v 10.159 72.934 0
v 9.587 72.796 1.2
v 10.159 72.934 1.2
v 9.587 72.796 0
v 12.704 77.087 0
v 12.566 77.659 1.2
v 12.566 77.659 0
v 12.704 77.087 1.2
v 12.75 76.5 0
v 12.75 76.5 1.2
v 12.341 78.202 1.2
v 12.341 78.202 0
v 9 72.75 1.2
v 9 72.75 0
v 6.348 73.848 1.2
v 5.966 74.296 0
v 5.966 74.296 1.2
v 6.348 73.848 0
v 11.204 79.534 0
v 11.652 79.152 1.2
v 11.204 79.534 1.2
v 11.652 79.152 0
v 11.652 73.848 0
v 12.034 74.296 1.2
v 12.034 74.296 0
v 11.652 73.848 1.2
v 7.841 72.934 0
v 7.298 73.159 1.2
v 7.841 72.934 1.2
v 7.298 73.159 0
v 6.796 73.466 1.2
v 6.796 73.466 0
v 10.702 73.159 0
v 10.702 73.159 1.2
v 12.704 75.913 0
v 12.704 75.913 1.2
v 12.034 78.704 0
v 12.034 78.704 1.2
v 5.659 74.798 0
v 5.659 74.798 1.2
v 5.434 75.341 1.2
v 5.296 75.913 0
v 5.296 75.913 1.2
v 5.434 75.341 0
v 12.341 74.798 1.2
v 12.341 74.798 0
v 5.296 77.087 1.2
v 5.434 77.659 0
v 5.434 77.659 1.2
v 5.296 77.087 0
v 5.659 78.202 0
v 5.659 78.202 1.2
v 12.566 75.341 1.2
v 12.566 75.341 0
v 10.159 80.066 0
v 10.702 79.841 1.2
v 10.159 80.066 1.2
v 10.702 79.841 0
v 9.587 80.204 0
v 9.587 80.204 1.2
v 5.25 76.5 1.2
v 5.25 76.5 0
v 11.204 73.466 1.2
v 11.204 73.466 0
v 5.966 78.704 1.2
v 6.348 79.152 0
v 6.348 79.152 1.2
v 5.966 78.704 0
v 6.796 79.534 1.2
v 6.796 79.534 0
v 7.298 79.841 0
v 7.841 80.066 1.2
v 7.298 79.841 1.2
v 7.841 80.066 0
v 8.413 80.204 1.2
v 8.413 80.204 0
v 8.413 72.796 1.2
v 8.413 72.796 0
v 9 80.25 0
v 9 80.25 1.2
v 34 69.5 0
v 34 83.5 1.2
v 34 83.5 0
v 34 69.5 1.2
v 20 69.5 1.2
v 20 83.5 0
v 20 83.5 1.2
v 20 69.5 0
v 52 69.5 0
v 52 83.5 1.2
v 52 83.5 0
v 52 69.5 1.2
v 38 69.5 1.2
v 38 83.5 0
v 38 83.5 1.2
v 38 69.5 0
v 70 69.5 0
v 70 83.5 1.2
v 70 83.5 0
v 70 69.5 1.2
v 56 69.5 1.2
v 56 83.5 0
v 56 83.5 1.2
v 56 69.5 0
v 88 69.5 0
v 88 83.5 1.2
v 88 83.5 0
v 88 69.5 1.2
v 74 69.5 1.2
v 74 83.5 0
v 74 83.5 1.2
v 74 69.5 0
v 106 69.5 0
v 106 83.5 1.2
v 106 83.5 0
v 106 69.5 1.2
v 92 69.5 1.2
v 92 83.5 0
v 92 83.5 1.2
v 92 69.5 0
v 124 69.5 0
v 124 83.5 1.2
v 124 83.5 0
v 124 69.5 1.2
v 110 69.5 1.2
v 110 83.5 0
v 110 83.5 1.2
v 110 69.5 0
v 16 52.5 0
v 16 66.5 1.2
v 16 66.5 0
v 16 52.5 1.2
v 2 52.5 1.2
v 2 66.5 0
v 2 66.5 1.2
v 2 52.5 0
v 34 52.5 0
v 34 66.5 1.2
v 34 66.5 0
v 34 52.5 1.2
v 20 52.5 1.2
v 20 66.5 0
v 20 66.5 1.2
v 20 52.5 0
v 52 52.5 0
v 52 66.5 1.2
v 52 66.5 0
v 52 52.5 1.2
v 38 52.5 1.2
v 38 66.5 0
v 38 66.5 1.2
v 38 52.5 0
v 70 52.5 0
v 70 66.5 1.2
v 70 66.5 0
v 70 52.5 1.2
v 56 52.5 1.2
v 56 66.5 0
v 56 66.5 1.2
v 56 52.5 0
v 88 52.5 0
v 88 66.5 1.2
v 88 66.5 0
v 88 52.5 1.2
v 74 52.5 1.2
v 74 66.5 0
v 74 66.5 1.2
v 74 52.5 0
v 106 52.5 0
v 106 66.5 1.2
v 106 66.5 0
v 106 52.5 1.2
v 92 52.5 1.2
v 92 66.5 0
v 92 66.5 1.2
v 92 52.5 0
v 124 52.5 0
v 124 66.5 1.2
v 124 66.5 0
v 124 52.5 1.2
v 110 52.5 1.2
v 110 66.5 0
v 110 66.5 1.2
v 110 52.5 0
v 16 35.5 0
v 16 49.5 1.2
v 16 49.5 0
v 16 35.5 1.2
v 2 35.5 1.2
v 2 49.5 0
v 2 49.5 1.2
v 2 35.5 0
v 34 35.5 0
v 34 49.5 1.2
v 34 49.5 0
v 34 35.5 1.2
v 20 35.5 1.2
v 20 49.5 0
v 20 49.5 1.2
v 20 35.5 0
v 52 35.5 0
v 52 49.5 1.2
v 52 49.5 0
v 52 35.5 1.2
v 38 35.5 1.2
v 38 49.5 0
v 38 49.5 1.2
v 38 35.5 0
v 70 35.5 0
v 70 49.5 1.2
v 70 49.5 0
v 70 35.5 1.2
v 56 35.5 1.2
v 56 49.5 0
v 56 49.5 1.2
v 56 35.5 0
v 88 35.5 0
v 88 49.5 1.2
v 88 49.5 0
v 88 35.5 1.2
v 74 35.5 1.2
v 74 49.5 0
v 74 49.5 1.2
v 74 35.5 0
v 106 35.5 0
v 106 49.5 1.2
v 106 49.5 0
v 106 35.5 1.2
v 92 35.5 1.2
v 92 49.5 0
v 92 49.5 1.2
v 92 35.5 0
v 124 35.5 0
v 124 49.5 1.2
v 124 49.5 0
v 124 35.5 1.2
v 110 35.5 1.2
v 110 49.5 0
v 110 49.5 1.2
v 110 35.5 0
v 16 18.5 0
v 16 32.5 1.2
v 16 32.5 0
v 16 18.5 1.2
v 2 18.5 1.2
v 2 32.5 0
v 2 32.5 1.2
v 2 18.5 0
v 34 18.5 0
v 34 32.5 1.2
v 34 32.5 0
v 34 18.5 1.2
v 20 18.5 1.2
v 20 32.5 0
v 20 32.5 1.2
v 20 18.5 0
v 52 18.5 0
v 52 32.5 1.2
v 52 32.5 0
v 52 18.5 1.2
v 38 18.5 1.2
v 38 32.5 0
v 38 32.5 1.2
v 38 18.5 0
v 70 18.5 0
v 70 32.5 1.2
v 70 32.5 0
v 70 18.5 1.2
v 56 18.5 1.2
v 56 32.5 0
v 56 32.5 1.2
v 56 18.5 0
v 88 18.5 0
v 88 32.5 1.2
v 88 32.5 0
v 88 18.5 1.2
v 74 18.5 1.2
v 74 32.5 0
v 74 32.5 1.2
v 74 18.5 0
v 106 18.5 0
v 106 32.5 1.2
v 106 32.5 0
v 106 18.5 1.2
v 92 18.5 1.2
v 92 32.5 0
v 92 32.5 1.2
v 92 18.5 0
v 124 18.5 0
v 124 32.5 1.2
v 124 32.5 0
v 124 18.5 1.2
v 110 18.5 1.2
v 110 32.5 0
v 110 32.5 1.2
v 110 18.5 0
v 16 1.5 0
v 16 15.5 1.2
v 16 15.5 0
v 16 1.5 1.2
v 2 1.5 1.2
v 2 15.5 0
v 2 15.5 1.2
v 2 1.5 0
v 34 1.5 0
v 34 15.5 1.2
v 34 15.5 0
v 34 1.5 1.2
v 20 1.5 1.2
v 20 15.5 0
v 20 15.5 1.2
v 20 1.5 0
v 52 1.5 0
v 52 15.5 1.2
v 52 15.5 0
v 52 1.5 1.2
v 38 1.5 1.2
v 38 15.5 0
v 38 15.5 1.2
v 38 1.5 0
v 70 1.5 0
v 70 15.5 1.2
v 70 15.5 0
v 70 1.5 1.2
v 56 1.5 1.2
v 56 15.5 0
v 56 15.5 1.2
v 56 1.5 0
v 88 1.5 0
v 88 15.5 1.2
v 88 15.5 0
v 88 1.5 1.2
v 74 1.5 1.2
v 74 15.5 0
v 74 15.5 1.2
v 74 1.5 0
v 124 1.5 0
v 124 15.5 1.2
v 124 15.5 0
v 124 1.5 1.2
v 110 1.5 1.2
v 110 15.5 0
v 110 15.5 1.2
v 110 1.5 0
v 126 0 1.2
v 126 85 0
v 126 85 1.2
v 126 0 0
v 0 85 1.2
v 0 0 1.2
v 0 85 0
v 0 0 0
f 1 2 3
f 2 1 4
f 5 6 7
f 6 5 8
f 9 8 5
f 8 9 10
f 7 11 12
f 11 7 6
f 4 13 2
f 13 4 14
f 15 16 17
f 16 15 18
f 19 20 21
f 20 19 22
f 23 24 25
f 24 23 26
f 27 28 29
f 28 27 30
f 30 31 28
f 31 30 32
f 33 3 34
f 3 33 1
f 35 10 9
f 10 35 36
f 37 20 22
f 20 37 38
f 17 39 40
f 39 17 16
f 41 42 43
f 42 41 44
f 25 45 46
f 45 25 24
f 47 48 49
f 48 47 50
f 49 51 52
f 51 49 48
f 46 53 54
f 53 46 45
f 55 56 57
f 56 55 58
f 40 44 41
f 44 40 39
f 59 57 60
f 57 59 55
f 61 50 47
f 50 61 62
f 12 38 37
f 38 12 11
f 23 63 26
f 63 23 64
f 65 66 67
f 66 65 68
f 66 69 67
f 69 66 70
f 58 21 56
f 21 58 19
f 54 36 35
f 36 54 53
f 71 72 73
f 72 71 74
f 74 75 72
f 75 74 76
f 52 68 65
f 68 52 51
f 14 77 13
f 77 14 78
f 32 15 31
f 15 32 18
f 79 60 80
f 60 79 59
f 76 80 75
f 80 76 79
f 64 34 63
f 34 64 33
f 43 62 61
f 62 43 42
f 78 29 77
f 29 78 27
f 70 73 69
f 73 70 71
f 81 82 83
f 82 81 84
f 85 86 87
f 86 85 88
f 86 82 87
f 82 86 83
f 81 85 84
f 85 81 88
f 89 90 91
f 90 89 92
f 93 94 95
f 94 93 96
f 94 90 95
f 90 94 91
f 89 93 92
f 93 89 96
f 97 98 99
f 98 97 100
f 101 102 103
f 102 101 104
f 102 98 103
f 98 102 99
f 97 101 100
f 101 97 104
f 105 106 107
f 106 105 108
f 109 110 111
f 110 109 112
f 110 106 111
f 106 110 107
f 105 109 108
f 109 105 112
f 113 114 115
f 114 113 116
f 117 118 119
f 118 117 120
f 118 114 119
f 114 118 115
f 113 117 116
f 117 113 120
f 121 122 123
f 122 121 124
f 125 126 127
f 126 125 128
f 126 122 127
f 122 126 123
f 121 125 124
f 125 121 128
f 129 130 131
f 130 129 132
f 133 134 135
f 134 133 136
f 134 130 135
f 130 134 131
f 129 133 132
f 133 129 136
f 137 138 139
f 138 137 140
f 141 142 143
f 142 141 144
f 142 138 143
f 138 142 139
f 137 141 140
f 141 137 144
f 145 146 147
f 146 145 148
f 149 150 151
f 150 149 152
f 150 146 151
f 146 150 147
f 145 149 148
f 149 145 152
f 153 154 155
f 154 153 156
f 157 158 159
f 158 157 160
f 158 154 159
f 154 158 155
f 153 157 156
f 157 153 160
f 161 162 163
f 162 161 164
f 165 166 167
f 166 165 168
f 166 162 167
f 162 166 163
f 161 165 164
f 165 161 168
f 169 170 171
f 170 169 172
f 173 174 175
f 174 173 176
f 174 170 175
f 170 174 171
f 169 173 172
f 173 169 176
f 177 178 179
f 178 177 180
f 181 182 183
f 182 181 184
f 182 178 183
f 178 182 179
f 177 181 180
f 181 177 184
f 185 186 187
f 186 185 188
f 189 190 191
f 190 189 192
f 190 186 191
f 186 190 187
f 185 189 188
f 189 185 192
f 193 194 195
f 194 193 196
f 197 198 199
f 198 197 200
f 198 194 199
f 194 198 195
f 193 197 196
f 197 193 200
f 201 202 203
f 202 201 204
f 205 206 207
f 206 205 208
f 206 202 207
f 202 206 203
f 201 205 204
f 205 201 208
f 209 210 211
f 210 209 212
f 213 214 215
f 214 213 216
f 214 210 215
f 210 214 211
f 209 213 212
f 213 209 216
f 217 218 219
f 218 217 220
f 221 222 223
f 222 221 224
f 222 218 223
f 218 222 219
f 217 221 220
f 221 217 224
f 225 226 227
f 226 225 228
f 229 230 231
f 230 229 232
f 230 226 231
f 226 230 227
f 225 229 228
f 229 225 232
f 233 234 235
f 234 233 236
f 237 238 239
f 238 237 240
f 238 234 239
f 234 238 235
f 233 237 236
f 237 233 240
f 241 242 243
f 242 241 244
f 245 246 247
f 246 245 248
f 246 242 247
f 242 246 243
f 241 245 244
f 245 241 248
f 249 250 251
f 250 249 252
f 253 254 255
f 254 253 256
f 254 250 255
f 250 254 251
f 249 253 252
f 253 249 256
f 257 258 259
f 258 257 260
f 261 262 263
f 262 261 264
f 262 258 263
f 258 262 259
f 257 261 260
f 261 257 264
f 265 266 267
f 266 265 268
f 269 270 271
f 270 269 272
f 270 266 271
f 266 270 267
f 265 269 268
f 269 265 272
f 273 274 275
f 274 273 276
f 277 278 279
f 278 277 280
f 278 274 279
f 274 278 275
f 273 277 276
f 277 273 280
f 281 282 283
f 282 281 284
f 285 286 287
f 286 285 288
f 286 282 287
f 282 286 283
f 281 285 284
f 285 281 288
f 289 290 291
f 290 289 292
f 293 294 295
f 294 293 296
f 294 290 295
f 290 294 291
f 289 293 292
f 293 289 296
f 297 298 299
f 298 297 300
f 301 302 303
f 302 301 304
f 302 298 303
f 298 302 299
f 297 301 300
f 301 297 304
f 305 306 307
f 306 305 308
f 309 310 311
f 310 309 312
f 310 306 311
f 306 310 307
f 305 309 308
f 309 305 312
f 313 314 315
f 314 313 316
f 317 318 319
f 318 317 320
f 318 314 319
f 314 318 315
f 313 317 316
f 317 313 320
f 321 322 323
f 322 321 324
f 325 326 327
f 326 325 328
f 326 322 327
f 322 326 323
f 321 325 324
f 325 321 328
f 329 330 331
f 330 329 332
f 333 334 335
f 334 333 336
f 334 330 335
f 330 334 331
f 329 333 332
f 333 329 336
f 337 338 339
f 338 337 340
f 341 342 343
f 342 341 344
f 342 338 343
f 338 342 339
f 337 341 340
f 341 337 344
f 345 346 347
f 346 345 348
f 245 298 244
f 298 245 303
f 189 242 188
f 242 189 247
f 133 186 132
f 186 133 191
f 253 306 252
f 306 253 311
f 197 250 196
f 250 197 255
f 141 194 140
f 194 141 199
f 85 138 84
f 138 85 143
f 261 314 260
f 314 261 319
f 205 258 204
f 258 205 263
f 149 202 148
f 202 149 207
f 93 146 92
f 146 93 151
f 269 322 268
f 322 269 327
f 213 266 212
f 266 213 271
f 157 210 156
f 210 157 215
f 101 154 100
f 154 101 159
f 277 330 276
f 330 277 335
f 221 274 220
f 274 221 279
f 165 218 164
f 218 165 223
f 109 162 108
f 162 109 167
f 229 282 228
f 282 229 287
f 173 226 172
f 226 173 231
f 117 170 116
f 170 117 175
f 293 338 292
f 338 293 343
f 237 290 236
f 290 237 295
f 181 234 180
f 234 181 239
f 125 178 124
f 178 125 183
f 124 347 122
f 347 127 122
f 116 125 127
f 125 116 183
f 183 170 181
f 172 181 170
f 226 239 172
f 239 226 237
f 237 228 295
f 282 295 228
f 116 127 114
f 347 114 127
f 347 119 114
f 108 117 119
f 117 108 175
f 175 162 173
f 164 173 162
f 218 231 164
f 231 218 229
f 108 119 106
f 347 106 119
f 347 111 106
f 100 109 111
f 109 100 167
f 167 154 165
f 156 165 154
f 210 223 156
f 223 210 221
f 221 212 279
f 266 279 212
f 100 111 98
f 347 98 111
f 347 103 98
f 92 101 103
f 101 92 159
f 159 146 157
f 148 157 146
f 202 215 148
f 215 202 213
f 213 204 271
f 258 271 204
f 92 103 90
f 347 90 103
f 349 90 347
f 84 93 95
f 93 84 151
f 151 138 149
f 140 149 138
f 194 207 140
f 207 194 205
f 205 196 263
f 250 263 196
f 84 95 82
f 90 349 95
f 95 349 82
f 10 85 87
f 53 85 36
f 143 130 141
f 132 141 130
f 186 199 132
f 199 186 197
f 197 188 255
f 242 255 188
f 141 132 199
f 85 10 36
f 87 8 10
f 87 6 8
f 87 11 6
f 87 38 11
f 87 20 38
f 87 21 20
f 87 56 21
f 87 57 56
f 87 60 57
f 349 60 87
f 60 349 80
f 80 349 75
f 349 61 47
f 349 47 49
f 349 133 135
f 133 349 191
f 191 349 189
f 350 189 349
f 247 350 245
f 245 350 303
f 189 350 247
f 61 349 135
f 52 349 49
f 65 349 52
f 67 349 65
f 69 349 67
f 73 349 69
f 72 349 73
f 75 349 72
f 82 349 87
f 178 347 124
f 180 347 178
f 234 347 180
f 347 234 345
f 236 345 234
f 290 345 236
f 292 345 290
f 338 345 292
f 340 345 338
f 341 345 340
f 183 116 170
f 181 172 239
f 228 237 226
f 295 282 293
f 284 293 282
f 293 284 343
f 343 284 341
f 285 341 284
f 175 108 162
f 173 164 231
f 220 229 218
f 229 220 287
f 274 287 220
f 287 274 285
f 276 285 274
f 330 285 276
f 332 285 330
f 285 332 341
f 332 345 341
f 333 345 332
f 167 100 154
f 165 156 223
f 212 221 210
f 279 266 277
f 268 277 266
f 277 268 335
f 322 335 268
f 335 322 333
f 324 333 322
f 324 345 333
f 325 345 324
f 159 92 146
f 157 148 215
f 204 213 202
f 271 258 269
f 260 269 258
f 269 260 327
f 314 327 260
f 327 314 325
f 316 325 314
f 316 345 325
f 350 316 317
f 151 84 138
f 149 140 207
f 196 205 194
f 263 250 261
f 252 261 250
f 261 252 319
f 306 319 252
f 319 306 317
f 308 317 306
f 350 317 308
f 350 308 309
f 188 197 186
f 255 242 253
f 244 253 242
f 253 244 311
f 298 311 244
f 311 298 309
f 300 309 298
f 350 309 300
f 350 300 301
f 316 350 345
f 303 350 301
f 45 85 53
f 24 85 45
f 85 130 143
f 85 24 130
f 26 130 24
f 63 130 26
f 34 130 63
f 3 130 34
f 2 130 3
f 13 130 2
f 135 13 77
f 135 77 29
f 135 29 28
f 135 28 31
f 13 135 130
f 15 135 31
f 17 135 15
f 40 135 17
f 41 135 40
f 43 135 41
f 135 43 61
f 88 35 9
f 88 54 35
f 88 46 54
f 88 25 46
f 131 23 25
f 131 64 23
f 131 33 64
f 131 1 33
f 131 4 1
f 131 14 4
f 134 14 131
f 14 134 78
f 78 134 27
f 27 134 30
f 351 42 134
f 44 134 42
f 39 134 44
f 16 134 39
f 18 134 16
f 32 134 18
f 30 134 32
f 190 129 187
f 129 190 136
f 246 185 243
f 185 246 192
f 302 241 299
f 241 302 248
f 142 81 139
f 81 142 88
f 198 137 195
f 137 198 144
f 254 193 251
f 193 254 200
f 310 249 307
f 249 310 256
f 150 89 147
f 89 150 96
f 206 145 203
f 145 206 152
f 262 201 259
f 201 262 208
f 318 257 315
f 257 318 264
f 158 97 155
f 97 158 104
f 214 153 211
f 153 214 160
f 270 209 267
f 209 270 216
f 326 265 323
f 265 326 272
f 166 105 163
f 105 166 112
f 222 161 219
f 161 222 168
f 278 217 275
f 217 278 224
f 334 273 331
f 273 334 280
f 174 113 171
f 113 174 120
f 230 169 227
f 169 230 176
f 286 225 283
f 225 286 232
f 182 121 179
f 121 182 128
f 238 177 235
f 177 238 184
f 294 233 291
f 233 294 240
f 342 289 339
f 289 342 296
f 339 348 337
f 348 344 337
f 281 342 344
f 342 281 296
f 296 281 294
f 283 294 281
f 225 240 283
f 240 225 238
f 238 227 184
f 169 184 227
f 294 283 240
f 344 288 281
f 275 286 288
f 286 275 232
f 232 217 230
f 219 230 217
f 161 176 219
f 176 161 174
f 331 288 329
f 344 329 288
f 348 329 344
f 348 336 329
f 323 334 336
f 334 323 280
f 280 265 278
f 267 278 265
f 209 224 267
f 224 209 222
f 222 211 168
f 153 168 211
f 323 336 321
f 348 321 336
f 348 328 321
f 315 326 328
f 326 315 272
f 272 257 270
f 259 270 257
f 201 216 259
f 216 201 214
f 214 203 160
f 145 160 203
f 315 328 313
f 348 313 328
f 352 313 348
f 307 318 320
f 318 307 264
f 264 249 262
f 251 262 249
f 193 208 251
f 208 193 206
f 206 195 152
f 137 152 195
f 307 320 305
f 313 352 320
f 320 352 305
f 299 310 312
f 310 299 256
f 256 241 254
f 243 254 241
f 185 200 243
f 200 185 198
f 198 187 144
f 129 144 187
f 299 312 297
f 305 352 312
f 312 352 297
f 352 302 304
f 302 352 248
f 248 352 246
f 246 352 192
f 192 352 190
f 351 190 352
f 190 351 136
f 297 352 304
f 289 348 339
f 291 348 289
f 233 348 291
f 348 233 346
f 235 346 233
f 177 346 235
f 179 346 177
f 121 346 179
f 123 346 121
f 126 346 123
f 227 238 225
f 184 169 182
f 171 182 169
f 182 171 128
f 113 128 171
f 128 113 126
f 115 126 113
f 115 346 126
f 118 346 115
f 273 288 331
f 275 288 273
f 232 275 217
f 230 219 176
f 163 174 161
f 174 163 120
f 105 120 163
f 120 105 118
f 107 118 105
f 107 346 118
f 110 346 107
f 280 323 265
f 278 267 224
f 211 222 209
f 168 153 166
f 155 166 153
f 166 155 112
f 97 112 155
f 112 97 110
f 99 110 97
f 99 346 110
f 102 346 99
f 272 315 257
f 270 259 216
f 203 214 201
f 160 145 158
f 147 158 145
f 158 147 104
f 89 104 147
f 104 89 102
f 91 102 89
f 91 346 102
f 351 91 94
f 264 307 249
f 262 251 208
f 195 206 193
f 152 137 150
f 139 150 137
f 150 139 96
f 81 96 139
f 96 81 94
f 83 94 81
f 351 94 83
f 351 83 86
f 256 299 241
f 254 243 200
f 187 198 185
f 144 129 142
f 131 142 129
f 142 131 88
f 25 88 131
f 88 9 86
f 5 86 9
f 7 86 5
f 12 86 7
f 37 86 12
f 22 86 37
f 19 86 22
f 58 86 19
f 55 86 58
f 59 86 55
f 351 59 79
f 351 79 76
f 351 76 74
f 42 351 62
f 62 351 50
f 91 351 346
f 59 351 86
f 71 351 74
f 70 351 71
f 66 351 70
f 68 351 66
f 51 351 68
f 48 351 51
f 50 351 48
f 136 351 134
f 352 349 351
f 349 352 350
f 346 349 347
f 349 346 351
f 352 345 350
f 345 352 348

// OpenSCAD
// file: interlock_params.scad
/*
 * Interlock Ergo - Precision Engineering & Joint Parameters
 * Dual standard: Kailh Choc v1 (crkbd/corne style) and Cherry MX.
 */

$fn = 40;

// Mechanical Tolerances
interlock_tol = 0.25;     // 0.25mm sliding joint clearance
fillet_r = 3.0;           // Exterior corner fillet radius
wall_thickness = 4.0;     // Perimeter wall thickness
floor_thickness = 2.4;    // Floor thickness
shelf_depth = 1.5;        // Switch plate perimeter retention shelf
standoff_h = 3.5;         // PCB mounting standoff height
boss_d = 5.0;             // Standoff boss outer diameter
screw_d = 2.2;            // M2 thread clearance hole

// Magnets (6.0mm diameter x 3.0mm thickness N52 disc)
magnet_d = 6.15;          // 6.15mm diameter pocket (snug slip fit)
magnet_depth = 3.2;       // 3.2mm depth
wall_skin = 0.8;          // 0.8mm protective wall between magnet and mating seam

// Kailh Choc v1 (Corne/crkbd Low-Profile Standard)
choc_pitch_x = 18.0;
choc_pitch_y = 17.0;
choc_switch_cutout = 14.0;// 14.0mm square aperture (Kailh 13.8 ±0.2 max bound)
choc_plate_thickness = 1.2;// 1.2mm plate mandatory for Choc stabilizer latching
choc_case_depth = 13.0;   // Floor + Battery pocket + PCB + Sockets + Plate

// Cherry MX Standard
mx_pitch_x = 19.05;
mx_pitch_y = 19.05;
mx_switch_cutout = 14.0;
mx_plate_thickness = 1.5;
mx_case_depth = 16.5;

// Horizontal sliding dovetail joint (male tab: narrow throat, wide head)
module horizontal_dovetail_male(length, height) {
    // Narrow base 6mm, wide head 9mm, protrusion 4.5mm
    linear_extrude(height = height) {
        polygon(points = [
            [0, -3.0],
            [4.5, -4.5],
            [4.5, 4.5],
            [0, 3.0]
        ]);
    }
}

// Horizontal sliding dovetail socket (with tolerance)
module horizontal_dovetail_female(length, height) {
    tol = interlock_tol;
    linear_extrude(height = height + 1.0) {
        polygon(points = [
            [-0.1, -3.0 - tol],
            [4.5 + tol, -4.5 - tol],
            [4.5 + tol, 4.5 + tol],
            [-0.1, 3.0 + tol]
        ]);
    }
}

// Rounded box utility
module rounded_box(w, l, h, r) {
    hull() {
        translate([r, r, 0]) cylinder(r = r, h = h);
        translate([w - r, r, 0]) cylinder(r = r, h = h);
        translate([w - r, l - r, 0]) cylinder(r = r, h = h);
        translate([r, l - r, 0]) cylinder(r = r, h = h);
    }
}

// PCB Standoff boss
module standoff_boss(h) {
    difference() {
        cylinder(d = boss_d, h = h);
        translate([0, 0, -0.5])
            cylinder(d = screw_d, h = h + 1.0);
    }
}
// main file
/*
 * Interlock Ergo Switch Plate - Kailh Choc v1 Low-Profile
 * Plate thickness: 1.2mm (Mandatory for Choc stabilizer clip retention)
 * Matches firmware switch matrix: 34 keys left (with encoder hole), 42 keys right.
 */

include <interlock_params.scad>

cols_left = 7;
cols_right = 9;
rows = 5;

plate_w_left = cols_left * choc_pitch_x;
plate_l_left = rows * choc_pitch_y;

plate_w_right = cols_right * choc_pitch_x;
plate_l_right = rows * choc_pitch_y;

module choc_plate_left() {
    difference() {
        cube([plate_w_left, plate_l_left, choc_plate_thickness]);

        for (r = [0 : rows - 1]) {
            for (c = [0 : cols_left - 1]) {
                if (r == 0 && c == 0) {
                    // Encoder mounting hole
                    translate([c * choc_pitch_x + choc_pitch_x * 0.5, (rows - 1 - r) * choc_pitch_y + choc_pitch_y * 0.5, -1])
                        cylinder(d = 7.5, h = choc_plate_thickness + 2);
                } else if (r == 4 && c == 5) {
                    // Skip omitted 2.25u space gap
                } else {
                    translate([c * choc_pitch_x + (choc_pitch_x - choc_switch_cutout) * 0.5,
                               (rows - 1 - r) * choc_pitch_y + (choc_pitch_y - choc_switch_cutout) * 0.5,
                               -1])
                        cube([choc_switch_cutout, choc_switch_cutout, choc_plate_thickness + 2]);
                }
            }
        }
    }
}

module choc_plate_right() {
    difference() {
        cube([plate_w_right, plate_l_right, choc_plate_thickness]);

        for (r = [0 : rows - 1]) {
            for (c = [0 : cols_right - 1]) {
                if (r == 2 && (c == 7 || c == 8)) {
                    // Home row terminates at Enter (7 keys)
                } else if (r == 4 && c == 8) {
                    // Bottom row terminates at 8 keys
                } else {
                    translate([c * choc_pitch_x + (choc_pitch_x - choc_switch_cutout) * 0.5,
                               (rows - 1 - r) * choc_pitch_y + (choc_pitch_y - choc_switch_cutout) * 0.5,
                               -1])
                        cube([choc_switch_cutout, choc_switch_cutout, choc_plate_thickness + 2]);
                }
            }
        }
    }
}

mode = "left";

if (mode == "left") {
    choc_plate_left();
} else {
    choc_plate_right();
}
